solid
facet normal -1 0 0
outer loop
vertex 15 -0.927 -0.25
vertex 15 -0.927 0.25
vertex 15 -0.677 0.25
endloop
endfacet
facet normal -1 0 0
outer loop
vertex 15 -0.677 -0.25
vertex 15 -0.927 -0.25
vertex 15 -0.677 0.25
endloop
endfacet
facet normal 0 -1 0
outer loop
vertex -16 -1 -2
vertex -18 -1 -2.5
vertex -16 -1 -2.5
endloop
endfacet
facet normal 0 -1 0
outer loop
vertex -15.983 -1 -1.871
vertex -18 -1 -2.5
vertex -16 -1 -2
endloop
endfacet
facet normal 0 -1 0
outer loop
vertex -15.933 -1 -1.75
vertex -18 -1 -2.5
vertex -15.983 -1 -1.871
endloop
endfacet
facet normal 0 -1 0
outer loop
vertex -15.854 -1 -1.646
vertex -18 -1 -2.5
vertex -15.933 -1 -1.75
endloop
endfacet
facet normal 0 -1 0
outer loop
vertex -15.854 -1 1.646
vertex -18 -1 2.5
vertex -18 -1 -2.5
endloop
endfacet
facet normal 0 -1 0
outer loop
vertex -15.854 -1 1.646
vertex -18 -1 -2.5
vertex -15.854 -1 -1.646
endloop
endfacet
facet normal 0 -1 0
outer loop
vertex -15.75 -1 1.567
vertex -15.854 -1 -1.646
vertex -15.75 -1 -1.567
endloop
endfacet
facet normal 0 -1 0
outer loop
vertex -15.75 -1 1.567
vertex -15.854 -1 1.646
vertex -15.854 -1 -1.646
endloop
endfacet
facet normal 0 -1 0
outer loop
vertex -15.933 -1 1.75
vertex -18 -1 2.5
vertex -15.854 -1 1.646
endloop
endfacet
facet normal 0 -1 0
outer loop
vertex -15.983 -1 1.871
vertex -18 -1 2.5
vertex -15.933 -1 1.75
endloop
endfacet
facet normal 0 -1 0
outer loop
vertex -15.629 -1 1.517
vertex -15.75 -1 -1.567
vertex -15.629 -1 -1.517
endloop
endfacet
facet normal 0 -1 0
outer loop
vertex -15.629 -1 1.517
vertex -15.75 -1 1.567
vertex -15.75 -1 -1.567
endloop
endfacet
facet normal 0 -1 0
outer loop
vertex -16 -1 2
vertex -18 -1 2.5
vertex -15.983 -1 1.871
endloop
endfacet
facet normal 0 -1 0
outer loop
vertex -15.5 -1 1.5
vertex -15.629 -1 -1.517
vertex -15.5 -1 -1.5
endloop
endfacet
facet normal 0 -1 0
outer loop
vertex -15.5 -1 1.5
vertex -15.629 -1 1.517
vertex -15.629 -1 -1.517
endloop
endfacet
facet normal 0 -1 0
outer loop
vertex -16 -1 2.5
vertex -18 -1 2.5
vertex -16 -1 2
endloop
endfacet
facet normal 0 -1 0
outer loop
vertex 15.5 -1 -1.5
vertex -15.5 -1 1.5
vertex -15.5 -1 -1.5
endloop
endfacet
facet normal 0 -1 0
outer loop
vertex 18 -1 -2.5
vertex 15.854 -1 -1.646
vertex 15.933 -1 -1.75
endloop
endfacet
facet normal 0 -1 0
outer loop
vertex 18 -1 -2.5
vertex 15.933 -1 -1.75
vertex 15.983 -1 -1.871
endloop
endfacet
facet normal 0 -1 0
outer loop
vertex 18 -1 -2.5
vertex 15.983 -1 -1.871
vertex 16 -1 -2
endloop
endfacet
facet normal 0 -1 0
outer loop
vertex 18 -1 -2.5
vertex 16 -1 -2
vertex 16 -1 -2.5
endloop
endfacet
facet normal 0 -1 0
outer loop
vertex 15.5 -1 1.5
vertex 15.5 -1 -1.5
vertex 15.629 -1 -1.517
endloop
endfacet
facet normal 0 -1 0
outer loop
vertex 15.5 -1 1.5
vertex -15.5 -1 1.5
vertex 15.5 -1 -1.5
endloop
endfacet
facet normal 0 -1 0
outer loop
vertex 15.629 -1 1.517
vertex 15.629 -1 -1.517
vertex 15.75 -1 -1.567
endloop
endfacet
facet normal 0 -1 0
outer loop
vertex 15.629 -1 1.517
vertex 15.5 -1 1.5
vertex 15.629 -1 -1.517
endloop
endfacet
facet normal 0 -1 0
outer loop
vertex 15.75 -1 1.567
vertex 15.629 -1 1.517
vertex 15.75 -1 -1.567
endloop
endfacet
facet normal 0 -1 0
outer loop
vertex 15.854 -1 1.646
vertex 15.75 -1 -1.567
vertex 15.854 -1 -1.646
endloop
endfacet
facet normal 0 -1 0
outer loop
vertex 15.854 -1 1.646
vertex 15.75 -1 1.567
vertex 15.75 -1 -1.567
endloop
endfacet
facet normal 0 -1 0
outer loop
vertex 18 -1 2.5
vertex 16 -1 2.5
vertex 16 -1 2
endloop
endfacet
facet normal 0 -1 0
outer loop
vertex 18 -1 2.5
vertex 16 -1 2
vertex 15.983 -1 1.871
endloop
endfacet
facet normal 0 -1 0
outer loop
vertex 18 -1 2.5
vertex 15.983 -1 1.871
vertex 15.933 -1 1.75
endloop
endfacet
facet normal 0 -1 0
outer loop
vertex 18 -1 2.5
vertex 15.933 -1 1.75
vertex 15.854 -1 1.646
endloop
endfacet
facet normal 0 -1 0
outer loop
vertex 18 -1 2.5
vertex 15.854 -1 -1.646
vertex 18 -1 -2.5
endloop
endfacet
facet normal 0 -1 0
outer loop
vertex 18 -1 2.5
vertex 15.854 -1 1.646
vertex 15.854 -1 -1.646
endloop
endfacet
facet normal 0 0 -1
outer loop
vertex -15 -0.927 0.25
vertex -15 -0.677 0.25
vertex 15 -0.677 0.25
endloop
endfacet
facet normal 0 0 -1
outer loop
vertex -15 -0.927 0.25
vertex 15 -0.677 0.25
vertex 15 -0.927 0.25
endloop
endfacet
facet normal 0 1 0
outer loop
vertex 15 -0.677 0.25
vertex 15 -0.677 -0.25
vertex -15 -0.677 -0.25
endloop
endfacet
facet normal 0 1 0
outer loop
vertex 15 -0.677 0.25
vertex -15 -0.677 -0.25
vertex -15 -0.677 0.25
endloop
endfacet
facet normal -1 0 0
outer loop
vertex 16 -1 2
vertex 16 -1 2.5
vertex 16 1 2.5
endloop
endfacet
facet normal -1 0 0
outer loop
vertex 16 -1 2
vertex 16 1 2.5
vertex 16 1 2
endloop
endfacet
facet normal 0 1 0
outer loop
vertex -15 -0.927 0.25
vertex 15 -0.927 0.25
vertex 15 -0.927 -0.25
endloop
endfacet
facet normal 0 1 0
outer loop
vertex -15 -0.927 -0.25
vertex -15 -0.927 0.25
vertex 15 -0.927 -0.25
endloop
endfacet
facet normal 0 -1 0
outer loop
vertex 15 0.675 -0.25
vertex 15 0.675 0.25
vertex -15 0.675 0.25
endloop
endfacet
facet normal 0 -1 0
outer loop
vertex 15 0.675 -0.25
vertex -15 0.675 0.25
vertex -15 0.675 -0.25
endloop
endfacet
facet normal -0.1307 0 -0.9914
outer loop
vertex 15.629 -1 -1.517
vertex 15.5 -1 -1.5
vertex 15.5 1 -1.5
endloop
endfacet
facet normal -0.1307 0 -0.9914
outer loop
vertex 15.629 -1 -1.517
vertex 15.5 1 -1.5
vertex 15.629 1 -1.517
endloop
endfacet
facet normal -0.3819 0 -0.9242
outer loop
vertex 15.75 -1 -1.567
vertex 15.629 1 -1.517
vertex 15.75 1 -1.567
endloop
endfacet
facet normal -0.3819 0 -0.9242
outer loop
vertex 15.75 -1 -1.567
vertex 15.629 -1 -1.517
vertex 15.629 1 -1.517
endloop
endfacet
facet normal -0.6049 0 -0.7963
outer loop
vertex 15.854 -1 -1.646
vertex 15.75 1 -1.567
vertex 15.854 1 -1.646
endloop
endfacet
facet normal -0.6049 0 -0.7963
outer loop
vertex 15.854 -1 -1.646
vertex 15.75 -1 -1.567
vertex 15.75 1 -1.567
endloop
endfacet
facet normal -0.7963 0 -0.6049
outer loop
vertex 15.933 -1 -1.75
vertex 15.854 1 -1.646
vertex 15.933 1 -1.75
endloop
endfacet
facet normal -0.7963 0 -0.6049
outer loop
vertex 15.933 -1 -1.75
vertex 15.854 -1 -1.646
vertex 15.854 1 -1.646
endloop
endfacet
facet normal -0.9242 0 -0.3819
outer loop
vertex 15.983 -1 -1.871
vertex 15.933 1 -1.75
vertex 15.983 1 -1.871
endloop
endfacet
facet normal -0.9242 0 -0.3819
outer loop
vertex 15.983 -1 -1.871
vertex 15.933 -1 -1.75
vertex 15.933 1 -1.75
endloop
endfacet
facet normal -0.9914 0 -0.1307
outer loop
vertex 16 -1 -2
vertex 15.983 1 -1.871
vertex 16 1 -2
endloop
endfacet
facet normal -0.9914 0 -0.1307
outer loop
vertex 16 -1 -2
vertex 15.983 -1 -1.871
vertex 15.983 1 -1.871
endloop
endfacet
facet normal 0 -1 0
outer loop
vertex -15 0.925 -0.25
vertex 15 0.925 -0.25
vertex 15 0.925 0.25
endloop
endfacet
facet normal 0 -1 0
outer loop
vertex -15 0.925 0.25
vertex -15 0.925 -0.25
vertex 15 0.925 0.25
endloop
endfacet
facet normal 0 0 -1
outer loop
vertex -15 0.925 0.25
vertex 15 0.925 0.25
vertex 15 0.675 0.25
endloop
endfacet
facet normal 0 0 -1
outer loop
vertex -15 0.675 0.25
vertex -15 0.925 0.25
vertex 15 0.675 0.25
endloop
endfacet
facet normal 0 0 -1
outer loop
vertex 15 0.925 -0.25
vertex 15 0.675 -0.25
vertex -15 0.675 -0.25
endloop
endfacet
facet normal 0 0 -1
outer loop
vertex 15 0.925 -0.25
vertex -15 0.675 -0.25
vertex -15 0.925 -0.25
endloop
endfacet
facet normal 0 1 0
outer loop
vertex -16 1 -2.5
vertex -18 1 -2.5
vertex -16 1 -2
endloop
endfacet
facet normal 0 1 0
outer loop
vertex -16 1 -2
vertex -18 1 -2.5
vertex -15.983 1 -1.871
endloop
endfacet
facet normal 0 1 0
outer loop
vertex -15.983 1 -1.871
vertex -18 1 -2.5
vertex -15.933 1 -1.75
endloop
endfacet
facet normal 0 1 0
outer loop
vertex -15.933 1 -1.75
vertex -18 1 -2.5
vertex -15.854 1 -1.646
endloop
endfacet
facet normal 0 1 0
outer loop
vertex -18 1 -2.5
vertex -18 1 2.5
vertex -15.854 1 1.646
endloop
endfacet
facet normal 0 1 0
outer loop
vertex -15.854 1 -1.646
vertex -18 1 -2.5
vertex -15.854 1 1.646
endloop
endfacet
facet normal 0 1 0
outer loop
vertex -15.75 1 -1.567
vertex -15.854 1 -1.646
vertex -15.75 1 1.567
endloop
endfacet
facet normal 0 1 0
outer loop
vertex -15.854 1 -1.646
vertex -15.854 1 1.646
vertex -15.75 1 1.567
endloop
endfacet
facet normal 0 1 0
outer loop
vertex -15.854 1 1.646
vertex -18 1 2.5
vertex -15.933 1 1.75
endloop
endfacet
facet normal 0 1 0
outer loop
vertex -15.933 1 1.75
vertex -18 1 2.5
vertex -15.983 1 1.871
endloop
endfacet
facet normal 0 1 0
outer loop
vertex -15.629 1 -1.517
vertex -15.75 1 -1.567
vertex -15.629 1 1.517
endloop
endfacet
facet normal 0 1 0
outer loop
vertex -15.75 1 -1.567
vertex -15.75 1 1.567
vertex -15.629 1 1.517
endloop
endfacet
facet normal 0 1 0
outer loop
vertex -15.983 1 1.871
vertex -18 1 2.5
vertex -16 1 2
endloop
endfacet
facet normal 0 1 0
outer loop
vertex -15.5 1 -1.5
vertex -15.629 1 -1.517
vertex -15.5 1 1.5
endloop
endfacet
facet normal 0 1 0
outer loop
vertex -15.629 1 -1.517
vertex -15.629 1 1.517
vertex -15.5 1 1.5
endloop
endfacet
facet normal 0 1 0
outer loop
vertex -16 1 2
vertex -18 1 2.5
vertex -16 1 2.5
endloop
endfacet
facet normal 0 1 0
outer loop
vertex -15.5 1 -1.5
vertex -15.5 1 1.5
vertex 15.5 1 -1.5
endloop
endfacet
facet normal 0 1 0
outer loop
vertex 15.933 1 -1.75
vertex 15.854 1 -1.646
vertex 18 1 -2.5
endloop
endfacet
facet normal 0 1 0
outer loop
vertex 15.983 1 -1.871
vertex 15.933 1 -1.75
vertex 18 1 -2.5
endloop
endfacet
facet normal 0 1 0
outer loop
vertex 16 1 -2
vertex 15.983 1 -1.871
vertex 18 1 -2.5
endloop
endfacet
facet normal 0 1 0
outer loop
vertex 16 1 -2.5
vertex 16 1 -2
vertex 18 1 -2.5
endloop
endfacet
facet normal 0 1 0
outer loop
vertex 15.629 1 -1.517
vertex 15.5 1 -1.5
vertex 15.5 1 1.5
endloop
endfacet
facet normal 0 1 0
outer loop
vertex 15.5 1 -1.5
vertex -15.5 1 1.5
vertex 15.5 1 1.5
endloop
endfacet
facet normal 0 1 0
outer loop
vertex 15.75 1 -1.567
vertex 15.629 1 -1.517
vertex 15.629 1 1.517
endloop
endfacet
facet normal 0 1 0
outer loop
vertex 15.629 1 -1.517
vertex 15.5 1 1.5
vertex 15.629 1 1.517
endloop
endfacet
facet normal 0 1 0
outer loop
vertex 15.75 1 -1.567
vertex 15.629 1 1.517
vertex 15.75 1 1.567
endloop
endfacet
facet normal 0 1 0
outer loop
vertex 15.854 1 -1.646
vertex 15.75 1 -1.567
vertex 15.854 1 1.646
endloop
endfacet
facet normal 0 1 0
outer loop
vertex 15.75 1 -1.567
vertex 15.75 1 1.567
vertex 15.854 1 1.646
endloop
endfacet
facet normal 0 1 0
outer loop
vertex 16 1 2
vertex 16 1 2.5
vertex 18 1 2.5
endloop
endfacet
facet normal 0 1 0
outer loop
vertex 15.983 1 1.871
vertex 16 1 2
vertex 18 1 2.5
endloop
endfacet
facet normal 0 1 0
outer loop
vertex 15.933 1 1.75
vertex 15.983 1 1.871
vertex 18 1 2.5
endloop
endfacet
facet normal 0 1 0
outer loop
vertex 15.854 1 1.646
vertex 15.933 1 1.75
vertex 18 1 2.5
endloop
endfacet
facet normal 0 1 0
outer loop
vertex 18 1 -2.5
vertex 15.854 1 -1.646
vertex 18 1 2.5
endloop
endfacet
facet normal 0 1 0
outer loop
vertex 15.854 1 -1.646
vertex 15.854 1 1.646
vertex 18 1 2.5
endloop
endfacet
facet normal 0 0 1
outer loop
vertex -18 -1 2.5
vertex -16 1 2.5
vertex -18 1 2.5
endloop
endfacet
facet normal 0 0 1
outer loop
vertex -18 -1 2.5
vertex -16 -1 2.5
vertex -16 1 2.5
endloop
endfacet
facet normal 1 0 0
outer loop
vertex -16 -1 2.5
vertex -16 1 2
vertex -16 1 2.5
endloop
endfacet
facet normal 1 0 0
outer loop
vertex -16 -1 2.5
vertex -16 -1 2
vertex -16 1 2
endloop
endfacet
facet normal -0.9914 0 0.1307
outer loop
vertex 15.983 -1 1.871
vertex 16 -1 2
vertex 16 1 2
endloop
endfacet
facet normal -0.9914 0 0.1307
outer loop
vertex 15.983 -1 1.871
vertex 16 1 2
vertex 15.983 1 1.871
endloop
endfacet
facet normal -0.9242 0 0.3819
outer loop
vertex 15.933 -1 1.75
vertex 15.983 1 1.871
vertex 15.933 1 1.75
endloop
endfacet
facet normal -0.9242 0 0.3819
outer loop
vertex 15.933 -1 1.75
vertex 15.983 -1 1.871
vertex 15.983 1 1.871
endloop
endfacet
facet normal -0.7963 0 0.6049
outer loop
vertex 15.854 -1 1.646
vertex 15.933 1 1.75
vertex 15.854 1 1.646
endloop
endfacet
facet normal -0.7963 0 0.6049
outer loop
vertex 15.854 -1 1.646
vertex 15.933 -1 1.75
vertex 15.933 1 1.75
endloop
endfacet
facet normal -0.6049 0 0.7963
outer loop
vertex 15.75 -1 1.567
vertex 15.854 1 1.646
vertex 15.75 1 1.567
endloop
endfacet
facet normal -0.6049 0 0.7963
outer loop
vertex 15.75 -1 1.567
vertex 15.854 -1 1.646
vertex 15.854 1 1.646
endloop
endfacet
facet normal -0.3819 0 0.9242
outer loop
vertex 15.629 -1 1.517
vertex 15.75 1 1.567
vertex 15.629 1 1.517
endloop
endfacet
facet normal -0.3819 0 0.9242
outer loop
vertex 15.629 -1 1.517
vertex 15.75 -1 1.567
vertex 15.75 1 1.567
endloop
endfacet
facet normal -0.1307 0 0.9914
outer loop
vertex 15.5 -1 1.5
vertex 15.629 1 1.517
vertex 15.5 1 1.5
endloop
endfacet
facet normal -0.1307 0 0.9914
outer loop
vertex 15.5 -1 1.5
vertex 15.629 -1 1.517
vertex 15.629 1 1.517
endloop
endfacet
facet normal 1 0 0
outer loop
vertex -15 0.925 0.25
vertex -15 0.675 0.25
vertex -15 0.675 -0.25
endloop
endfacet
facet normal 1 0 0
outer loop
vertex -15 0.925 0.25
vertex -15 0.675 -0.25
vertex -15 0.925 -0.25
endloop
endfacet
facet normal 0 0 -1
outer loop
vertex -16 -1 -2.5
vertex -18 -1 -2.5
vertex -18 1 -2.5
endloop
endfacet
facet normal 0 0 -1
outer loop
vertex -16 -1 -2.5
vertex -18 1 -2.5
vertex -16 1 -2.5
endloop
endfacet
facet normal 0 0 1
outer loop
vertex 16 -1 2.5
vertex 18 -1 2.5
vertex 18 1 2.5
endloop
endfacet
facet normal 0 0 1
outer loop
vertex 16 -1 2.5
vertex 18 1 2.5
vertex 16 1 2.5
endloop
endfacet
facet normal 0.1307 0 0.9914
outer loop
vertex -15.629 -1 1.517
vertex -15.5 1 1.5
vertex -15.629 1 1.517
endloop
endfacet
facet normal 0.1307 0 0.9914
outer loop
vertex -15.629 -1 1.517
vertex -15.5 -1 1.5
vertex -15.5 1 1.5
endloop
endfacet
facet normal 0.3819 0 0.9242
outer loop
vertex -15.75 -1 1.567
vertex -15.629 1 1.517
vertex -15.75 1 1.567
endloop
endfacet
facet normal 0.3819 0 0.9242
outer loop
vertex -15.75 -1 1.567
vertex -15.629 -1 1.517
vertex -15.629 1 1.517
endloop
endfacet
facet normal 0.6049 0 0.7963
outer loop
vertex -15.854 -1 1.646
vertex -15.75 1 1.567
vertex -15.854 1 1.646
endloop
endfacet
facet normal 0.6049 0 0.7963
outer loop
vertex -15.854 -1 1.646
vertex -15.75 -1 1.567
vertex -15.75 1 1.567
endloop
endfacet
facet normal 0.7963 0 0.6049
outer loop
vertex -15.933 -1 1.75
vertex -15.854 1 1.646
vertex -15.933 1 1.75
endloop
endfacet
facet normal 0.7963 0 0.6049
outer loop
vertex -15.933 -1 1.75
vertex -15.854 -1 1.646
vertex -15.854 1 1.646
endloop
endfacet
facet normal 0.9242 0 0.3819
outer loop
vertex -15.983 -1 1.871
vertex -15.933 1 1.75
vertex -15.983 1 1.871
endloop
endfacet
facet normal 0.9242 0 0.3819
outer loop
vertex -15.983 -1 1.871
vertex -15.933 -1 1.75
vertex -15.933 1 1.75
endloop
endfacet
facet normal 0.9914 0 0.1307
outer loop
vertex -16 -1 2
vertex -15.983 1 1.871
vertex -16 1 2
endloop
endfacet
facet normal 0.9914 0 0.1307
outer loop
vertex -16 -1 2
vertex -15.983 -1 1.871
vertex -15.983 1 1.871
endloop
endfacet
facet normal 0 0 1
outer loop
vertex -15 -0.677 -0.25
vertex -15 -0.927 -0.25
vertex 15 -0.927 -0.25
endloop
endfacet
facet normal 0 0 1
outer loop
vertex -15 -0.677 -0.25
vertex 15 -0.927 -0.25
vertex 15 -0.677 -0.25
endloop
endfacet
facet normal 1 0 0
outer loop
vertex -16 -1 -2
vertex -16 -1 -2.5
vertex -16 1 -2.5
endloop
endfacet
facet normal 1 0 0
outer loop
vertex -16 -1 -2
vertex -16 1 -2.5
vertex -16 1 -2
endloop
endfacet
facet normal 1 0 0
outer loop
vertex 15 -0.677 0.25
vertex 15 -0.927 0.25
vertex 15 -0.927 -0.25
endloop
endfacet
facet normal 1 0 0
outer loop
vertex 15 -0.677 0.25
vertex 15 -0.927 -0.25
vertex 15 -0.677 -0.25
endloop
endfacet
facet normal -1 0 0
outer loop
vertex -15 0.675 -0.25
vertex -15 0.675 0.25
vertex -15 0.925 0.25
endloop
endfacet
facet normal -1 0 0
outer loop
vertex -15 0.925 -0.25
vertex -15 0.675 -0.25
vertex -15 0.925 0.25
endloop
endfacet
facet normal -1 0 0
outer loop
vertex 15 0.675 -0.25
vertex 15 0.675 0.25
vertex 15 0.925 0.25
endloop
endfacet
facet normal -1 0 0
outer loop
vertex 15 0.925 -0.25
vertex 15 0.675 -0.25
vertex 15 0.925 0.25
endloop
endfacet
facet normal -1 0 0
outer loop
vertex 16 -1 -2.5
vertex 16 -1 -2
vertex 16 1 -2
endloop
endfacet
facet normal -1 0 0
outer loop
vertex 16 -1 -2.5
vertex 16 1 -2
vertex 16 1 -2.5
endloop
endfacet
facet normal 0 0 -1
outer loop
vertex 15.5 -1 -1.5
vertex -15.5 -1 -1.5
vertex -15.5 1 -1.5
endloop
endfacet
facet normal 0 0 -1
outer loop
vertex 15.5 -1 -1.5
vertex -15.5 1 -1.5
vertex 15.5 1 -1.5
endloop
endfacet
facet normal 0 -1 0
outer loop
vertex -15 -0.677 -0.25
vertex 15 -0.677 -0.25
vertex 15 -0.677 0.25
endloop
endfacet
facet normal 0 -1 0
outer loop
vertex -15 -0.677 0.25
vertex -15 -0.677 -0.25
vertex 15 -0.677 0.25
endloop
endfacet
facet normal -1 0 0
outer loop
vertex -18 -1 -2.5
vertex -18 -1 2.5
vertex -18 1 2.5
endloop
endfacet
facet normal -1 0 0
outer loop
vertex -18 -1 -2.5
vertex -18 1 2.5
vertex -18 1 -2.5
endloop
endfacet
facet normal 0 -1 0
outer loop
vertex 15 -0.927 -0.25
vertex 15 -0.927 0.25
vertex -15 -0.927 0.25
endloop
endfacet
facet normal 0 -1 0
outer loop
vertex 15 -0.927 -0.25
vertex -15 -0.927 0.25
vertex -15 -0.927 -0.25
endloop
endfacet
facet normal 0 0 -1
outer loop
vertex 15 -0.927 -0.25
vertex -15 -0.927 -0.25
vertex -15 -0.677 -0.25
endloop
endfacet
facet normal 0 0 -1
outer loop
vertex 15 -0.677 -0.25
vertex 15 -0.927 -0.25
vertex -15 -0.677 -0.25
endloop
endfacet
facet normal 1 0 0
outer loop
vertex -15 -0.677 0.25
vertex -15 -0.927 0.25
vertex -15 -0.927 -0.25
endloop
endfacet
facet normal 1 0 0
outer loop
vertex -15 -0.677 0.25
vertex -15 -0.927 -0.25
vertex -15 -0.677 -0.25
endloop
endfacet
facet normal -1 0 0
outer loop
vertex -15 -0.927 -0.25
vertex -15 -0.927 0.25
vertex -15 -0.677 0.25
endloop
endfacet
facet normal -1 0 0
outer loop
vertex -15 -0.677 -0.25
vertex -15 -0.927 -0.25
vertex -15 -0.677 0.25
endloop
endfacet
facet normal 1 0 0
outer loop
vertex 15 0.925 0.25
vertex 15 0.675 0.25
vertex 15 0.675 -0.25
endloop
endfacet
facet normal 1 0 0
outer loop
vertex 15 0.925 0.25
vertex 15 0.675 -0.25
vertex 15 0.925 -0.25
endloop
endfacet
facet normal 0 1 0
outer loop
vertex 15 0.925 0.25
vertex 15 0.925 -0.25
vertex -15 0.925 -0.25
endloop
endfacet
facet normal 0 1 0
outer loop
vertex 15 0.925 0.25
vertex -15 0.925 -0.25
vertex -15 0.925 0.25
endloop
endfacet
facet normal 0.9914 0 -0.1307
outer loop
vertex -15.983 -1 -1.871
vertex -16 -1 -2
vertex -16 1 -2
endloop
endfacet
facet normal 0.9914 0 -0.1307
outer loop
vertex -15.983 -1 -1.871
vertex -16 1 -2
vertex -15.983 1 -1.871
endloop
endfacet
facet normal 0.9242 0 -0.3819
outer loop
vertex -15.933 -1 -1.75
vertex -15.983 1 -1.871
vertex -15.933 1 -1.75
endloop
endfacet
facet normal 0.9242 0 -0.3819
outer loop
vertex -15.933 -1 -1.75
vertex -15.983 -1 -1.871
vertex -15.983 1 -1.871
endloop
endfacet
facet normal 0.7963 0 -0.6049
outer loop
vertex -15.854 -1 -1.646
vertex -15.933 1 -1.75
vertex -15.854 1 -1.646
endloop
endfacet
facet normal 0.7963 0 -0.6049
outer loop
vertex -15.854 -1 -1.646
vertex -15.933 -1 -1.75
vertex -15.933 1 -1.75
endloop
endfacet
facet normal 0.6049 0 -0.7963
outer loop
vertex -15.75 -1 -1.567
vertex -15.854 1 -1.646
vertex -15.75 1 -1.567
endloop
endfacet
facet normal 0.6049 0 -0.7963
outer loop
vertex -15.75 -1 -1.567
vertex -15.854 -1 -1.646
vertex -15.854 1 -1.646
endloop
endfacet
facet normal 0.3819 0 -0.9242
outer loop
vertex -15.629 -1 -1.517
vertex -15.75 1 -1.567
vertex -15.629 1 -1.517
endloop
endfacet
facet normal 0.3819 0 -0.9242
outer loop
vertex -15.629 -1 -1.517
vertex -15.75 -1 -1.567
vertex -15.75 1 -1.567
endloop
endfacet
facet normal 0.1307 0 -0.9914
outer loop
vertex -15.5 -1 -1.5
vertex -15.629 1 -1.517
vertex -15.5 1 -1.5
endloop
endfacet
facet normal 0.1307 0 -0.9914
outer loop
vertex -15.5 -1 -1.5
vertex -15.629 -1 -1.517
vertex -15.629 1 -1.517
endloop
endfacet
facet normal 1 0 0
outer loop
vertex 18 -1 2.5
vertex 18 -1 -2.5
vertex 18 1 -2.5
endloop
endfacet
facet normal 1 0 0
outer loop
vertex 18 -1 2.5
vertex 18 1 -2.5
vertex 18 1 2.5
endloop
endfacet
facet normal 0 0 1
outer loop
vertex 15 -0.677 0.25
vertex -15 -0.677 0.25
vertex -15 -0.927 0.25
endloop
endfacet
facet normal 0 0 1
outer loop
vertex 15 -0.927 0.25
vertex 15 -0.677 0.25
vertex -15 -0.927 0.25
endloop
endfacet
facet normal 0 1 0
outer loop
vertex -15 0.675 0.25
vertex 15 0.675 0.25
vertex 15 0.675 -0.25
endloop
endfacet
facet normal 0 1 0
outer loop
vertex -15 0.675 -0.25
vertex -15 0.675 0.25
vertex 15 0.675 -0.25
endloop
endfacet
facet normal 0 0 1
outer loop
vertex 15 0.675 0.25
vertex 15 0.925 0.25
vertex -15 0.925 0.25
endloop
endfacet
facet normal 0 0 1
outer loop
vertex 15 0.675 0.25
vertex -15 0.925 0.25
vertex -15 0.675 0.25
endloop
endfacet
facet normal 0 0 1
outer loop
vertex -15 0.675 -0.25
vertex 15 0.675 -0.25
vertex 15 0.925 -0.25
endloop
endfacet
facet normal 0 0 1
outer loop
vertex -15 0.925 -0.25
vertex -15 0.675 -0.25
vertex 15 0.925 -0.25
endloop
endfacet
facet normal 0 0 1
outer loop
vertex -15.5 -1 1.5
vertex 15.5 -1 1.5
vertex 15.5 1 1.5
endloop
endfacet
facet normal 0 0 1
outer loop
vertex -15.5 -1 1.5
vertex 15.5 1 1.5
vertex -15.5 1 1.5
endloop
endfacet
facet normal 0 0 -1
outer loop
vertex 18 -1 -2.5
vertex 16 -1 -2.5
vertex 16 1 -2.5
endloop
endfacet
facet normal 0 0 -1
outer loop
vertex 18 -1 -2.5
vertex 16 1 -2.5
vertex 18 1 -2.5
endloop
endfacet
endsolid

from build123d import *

# Parameters (mm, degrees)
F1_DEPTH = 1
F4_DEPTH = 30
F5_DEPTH = 30


with BuildPart() as f1:
    # F0 (on Front) → F1 (new body, symmetric)
    with BuildSketch(Plane.XZ):
        with BuildLine():
            Line((-16, 2.5), (-18, 2.5))
            Line((-18, 2.5), (-18, 0))
            Line((-18, 0), (0, 0))
            Line((0, 0), (0, 1.5))
            Line((0, 1.5), (-15.5, 1.5))
            ThreePointArc((-15.5, 1.5), (-15.8535533906, 1.6464466094), (-16, 2))
            Line((-16, 2), (-16, 2.5))
        make_face()
        with BuildLine():
            Line((0, 1.5), (0, 0))
            Line((0, 0), (18, 0))
            Line((18, 0), (18, 2.5))
            Line((18, 2.5), (16, 2.5))
            Line((16, 2.5), (16, 2))
            ThreePointArc((16, 2), (15.8535533906, 1.6464466094), (15.5, 1.5))
            Line((15.5, 1.5), (0, 1.5))
        make_face()
        with BuildLine():
            Line((0, 0), (-18, 0))
            Line((-18, 0), (-18, -2.5))
            Line((-18, -2.5), (-16, -2.5))
            Line((-16, -2.5), (-16, -2))
            ThreePointArc((-16, -2), (-15.8535533906, -1.6464466094), (-15.5, -1.5))
            Line((-15.5, -1.5), (0, -1.5))
            Line((0, -1.5), (15.5, -1.5))
            ThreePointArc((15.5, -1.5), (15.8535533906, -1.6464466094), (16, -2))
            Line((16, -2), (16, -2.5))
            Line((16, -2.5), (18, -2.5))
            Line((18, -2.5), (18, 0))
            Line((18, 0), (0, 0))
        make_face()
    extrude(amount=F1_DEPTH, both=True)

    # F3 (on offset) → F5 (cut)
    with BuildSketch(Plane.YZ.offset(15)):
        Polygon((0.925000053, -0.25), (0.925000053, 0.25), (0.674999947, 0.25), (0.674999947, 0), (0.674999947, -0.25), align=None)
        Polygon((-0.6768444622, -0.25), (-0.6768444622, 0), (-0.6768444622, 0.25), (-0.9268444622, 0.25), (-0.9268444622, -0.25), align=None)
    extrude(amount=-F5_DEPTH, mode=Mode.SUBTRACT)


with BuildPart() as f4:
    # F3 (on offset) → F4 (new body)
    with BuildSketch(Plane.YZ.offset(15)):
        Polygon((-0.6768444622, -0.25), (-0.6768444622, 0), (-0.6768444622, 0.25), (-0.9268444622, 0.25), (-0.9268444622, -0.25), align=None)
    extrude(amount=-F4_DEPTH)


with BuildPart() as f4b:
    # F3 (on offset) → F4, piece 2 (new body)
    with BuildSketch(Plane.YZ.offset(15)):
        Polygon((0.925000053, -0.25), (0.925000053, 0.25), (0.674999947, 0.25), (0.674999947, 0), (0.674999947, -0.25), align=None)
    extrude(amount=-F4_DEPTH)


solid = Compound([f1.part, f4.part, f4b.part])
